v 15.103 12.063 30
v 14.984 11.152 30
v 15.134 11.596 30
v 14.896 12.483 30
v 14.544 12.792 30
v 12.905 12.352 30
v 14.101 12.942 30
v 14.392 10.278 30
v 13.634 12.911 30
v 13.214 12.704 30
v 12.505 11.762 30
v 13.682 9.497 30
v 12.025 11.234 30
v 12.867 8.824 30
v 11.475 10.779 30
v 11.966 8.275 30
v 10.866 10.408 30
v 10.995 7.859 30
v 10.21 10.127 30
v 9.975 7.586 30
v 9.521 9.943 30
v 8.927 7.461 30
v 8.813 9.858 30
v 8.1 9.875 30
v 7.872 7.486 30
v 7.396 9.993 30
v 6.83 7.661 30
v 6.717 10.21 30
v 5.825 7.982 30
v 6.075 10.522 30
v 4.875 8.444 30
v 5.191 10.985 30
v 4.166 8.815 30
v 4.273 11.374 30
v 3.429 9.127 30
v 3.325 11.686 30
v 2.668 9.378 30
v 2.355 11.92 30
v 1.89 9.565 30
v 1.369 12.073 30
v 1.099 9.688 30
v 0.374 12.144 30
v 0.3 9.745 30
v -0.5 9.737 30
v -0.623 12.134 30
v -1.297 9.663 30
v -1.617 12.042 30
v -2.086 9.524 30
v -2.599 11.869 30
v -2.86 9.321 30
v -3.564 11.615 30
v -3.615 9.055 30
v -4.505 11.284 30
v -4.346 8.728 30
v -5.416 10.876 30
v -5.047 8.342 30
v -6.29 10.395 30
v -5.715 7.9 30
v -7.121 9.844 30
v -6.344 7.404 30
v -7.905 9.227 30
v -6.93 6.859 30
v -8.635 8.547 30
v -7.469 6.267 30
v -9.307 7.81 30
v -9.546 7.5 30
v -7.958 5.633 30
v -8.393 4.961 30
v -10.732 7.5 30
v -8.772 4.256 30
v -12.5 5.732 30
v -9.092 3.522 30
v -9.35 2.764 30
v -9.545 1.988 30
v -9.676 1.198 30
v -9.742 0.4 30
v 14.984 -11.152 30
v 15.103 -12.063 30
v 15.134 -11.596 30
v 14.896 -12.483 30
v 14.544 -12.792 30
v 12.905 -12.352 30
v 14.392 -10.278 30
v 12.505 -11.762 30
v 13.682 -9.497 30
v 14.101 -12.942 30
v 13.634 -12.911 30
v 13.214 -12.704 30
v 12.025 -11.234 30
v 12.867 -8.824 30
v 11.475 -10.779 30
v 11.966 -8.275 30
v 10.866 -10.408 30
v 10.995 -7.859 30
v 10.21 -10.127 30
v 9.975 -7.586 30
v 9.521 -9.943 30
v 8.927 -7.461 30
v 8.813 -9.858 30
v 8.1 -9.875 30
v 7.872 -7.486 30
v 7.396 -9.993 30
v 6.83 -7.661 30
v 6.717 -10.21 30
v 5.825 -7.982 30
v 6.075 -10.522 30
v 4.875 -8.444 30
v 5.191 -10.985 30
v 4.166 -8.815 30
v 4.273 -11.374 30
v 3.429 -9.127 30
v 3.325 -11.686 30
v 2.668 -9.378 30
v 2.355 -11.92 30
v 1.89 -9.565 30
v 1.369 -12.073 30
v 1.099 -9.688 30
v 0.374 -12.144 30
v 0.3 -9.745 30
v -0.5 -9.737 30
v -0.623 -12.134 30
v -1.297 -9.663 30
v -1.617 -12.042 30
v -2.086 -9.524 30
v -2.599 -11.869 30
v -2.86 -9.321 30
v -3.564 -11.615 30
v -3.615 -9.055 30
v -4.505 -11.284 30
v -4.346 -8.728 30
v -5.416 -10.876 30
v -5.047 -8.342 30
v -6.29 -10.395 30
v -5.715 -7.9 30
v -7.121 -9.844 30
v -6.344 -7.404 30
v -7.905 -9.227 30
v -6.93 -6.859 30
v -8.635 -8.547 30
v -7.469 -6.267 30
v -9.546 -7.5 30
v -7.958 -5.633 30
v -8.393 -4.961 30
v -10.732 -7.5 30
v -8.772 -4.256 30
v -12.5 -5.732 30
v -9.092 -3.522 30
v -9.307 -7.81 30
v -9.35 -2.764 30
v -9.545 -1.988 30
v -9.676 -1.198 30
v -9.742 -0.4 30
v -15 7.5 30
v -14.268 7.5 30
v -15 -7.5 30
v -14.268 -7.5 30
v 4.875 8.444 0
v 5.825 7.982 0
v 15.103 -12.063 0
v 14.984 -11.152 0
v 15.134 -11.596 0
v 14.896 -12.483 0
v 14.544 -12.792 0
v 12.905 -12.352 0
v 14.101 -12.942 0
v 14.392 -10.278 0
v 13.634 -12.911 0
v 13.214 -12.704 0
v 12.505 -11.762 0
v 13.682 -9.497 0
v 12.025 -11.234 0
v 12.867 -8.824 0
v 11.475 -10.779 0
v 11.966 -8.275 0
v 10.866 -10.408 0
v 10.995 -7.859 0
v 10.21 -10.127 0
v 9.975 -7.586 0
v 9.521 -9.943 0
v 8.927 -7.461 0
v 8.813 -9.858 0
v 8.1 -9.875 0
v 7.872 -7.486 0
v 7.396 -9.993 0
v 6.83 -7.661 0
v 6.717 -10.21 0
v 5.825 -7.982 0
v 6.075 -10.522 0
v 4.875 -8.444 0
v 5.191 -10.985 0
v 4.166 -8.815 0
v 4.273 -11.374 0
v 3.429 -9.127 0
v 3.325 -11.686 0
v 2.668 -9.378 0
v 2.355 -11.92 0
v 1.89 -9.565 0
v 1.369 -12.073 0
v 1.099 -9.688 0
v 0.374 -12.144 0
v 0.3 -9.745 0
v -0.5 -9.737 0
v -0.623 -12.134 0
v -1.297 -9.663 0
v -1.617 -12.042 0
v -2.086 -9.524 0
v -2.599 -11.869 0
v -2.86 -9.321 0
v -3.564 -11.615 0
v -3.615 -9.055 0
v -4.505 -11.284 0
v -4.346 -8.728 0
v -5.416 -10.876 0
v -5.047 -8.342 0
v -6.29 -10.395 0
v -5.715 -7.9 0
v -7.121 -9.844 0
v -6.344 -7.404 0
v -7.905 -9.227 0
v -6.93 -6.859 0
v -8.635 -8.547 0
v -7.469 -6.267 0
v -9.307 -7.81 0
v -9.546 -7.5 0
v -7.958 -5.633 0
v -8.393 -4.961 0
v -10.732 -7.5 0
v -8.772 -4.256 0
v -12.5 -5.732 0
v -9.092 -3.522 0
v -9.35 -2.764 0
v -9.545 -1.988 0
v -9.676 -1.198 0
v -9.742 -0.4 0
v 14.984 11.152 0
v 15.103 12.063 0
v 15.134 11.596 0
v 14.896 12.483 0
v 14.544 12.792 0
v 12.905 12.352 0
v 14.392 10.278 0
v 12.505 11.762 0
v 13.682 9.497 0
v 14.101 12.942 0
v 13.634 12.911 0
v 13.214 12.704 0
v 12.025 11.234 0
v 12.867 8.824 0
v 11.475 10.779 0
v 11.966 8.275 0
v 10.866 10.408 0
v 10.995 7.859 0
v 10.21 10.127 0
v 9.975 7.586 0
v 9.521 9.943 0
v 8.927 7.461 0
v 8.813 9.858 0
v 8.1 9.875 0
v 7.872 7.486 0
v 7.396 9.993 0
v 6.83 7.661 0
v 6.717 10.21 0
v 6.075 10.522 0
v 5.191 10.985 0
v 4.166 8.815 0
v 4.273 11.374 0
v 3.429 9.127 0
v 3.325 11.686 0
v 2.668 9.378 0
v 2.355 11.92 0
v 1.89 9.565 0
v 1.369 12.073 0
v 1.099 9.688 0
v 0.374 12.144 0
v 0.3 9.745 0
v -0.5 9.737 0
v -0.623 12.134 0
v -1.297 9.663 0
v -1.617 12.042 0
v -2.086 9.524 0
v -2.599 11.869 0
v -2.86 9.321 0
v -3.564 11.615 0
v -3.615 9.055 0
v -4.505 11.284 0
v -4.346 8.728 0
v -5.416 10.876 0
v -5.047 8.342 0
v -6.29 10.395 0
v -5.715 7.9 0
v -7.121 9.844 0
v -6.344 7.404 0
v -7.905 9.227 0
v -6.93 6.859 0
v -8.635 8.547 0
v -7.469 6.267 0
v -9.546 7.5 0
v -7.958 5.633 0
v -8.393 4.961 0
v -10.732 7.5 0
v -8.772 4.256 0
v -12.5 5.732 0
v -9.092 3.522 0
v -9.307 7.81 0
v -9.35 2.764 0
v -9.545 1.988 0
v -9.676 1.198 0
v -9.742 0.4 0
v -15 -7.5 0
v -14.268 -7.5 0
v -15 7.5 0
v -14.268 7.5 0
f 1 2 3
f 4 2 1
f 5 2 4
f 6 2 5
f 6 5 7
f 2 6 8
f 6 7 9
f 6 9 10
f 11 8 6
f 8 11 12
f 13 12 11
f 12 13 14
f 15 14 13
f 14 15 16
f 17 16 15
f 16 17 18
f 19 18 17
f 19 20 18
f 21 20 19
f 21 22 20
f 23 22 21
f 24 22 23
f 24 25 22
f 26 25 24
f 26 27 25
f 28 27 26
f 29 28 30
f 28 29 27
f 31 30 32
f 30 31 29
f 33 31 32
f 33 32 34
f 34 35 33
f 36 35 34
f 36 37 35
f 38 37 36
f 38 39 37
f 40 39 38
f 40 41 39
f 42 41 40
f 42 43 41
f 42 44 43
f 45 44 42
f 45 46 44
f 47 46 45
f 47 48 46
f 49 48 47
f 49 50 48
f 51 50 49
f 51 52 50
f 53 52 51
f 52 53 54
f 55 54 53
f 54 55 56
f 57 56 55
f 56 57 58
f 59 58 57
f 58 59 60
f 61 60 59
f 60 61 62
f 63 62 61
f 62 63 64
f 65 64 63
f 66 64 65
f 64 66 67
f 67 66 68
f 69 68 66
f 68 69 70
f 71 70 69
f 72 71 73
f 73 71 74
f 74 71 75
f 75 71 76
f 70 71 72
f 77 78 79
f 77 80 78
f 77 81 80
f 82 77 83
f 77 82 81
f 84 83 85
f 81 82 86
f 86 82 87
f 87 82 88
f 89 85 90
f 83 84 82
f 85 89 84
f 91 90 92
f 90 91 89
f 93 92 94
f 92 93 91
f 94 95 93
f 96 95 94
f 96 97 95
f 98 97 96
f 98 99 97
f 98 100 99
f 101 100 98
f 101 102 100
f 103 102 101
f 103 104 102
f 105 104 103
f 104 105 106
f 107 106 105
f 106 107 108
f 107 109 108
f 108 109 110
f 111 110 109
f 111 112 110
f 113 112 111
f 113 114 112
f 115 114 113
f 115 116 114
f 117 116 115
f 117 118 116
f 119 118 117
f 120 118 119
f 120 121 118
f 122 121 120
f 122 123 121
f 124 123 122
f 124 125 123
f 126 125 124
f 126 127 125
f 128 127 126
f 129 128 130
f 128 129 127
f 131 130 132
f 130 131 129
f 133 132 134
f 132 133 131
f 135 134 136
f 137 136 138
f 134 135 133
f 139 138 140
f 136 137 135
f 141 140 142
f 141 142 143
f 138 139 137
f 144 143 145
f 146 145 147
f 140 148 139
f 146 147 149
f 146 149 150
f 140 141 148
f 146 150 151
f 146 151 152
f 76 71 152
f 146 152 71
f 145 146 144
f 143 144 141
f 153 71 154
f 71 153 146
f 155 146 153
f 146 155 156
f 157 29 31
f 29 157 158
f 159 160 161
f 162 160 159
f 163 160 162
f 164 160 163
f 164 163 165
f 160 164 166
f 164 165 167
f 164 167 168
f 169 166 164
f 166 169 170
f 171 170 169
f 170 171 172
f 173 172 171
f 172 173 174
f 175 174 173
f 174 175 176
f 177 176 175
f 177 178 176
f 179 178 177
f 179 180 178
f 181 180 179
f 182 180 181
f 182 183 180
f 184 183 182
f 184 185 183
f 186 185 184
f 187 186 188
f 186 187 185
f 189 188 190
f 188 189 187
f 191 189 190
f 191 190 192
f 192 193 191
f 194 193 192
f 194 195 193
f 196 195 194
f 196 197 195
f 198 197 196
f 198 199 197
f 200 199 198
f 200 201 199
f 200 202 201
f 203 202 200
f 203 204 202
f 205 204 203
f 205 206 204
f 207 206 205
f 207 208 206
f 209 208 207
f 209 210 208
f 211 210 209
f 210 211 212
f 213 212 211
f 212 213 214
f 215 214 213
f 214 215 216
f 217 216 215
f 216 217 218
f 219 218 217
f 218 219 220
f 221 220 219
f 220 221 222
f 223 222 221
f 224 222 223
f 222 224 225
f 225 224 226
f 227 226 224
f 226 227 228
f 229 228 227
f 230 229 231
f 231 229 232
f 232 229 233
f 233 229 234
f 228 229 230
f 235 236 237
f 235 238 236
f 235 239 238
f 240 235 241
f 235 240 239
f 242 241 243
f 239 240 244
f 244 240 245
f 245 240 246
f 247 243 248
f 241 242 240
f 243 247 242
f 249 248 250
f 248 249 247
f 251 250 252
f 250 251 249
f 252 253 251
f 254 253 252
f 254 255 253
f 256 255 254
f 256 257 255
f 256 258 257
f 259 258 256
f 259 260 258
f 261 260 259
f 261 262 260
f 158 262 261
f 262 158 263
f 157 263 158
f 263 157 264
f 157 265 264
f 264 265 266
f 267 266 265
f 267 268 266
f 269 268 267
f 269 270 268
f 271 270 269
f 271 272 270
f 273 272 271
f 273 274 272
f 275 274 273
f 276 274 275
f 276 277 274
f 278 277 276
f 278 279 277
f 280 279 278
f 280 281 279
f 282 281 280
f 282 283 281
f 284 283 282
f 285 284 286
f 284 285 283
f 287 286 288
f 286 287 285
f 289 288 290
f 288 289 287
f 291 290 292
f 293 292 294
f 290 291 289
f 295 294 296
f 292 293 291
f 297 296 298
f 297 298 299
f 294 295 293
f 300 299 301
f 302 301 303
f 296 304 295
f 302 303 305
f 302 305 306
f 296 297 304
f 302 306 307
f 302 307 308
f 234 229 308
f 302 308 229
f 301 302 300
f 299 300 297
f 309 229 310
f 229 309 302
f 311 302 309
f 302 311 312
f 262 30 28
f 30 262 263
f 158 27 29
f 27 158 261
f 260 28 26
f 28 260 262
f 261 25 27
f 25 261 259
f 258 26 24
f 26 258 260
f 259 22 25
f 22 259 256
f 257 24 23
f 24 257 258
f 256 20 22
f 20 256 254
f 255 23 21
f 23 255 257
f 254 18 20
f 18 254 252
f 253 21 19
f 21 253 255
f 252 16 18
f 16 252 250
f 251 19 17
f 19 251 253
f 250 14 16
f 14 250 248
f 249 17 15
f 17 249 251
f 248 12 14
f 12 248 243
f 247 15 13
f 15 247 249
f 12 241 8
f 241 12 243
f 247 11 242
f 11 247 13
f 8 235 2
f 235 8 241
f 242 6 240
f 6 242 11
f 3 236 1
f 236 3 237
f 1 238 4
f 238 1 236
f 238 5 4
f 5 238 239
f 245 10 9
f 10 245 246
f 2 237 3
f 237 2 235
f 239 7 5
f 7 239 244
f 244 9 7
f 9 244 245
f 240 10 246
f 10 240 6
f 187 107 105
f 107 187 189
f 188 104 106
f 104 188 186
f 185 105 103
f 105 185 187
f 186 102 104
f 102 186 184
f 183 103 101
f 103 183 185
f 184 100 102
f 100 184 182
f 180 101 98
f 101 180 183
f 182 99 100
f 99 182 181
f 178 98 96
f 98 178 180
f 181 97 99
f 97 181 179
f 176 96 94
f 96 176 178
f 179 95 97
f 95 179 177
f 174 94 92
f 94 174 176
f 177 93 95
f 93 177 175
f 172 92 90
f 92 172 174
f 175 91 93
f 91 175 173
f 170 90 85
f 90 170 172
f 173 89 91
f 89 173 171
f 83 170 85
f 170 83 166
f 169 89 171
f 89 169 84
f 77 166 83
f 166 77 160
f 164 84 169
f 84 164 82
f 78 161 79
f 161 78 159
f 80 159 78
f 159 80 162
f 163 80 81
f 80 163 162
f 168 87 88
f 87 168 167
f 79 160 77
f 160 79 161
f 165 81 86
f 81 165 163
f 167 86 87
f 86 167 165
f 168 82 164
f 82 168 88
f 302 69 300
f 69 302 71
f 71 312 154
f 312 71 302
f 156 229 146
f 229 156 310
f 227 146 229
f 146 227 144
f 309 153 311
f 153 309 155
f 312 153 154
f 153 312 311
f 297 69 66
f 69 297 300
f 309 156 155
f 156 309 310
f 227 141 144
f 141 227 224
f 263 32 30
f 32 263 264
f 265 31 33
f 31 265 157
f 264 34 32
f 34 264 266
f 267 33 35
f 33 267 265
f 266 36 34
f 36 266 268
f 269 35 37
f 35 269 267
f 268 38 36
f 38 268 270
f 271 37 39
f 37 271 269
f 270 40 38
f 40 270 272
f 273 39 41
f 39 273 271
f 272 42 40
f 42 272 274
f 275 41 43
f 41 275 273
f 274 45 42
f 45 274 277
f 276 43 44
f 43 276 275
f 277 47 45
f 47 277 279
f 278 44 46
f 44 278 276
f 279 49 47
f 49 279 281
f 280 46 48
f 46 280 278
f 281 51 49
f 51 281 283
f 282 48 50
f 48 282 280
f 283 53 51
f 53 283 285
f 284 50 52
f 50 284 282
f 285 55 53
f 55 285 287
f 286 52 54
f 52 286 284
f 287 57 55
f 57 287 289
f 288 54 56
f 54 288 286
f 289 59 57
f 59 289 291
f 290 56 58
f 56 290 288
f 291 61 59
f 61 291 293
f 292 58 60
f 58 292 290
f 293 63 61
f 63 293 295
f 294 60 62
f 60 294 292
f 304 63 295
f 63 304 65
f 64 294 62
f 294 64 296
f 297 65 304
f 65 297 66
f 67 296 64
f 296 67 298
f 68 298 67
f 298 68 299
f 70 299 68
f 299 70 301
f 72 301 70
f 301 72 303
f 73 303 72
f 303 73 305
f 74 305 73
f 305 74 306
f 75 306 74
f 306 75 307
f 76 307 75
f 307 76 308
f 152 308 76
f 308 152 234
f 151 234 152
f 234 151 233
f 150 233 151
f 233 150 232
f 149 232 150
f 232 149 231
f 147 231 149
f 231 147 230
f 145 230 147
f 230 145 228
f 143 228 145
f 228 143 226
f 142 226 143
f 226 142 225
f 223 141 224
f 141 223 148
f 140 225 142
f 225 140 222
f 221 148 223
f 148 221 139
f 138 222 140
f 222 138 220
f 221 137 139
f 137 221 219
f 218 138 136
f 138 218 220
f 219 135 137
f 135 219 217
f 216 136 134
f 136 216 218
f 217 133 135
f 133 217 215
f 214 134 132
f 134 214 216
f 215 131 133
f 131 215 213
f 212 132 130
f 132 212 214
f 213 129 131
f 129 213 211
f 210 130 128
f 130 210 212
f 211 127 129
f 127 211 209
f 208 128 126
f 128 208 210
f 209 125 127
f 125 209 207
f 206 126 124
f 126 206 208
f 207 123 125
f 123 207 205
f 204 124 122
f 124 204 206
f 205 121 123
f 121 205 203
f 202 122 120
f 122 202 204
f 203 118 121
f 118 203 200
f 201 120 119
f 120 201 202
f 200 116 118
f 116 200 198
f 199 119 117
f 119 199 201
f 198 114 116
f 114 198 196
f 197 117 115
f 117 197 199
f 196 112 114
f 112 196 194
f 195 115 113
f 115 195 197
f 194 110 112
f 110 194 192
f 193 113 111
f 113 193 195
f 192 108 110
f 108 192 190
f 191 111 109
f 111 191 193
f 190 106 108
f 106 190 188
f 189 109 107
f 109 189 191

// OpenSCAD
// file: symmetry.scad
// duplicate and mirror
module mirror_dup(v) {
  children();
  mirror(v) children();
}

// duplicate and mirror in x
module mirror_dup_x () { mirror_dup([1,0,0]) children(); }
// duplicate and mirror in y
module mirror_dup_y () { mirror_dup([0,1,0]) children(); }
// duplicate and mirror in z
module mirror_dup_z () { mirror_dup([0,0,1]) children(); }

// translate in v and duplicate in +-d
module translate_s(v=[0,0,0],d=[0,0,0]) {
  translate(v) {
    translate(d) children();
    translate(-1*d) children();
  }
}

// translate and duplicate in +-x
module translate_xs(v=[0,0,0], dx=undef) {
  v = len(v)==2?[v.x,v.y,0]:v;
  if (is_undef(dx)) {
    translate(v) children();
    translate(v*[[-1,0,0],[0,1,0],[0,0,1]]) children();
  }
  else {
    translate(v) {
      translate([ dx,0,0]) children();
      translate([-dx,0,0]) children();
    }
  }
}

// translate and duplicate in +-y
module translate_ys(v=[0,0,0], dy=undef) {
  v = len(v)==2?[v.x,v.y,0]:v;
  if (is_undef(dy)) {
    translate(v) children();
    translate(v*[[1,0,0],[0,-1,0],[0,0,1]]) children();
  }
  else {
    translate(v) {
      translate([0, dy,0]) children();
      translate([0,-dy,0]) children();
    }
  }
}

// translate and duplicate in +-z
module translate_zs(v=[0,0,0], dz=undef) {
  if (is_undef(dz)) {
    translate(v) children();
    translate(v*[[1,0,0],[0,1,0],[0,0,-1]]) children();
  }
  else {
    translate(v) {
      translate([0,0, dz]) children();
      translate([0,0,-dz]) children();
    }
  }
}

// rotate +-a about v
module rotate_s(a,v=undef,orig=false) {
  if (orig == true) { children(); }
  if (is_list(a) || is_undef(v)) {
    rotate(a) children();
    rotate(-a) children();
  }
  else {
    rotate(a,v) children();
    rotate(-a,v) children();
  }
}

// rotate about vector starting at vs with direction v
module rotate_v(a, v=[0,0,1], vs=[0,0,0]) {
  translate(vs) rotate(a=a, v=v) translate(-1*vs) children();
}

// duplicate with rotational symmetry
module rsym(n) {
  for (a=[0:360/n:359]) rotate(a) children();
}

// rotate extrusion symmetric about x=0 plane
module rotate_extrude_s(angle=360,convexity=10) {
  rotate(-angle/2) rotate_extrude(angle=angle,convexity=convexity) children();
}
// file: metricparts.scad
include <threads.scad>

module nut_cut(fwidth, height, allowance=0) {
  cylinder($fn=6,r=(allowance+fwidth/2)/sin(60),h=height);
}

function get_hex_side(p) = lookup(p, [
 		[   1, 2.5 ],
 		[ 1.2, 3.0 ],
 		[ 1.4, 3.0 ],
 		[ 1.6, 3.2 ],
 		[   2, 4.0 ],
 		[ 2.5, 5.0 ],
 		[   3, 5.5 ],
 		[ 3.5, 6 ],
 		[   4, 7 ],
 		[   5, 8 ],
 		[   6, 10 ],
 		[   7, 11 ],
 		[   8, 13 ],
 		[  10, 17 ],
 	]);

function get_hex_major(p) = get_hex_side(p)/sin(60);

function get_hex_thick(p) = lookup(p, [
 		[   1, 0.8 ],
 		[ 1.2, 1 ],
 		[ 1.4, 1.2 ],
 		[ 1.6, 1.3 ],
 		[   2, 1.6 ],
 		[ 2.5, 2 ],
 		[   3, 2.4 ],
 		[ 3.5, 2.8 ],
 		[   4, 3.2 ],
 		[   5, 4 ],
 		[   6, 5 ],
 		[   7, 5.5 ],
 		[   8, 6.5 ],
 		[  10, 8 ],
 	]);

function get_pitch(p) = lookup(p, [
 		[   1, 0.25 ],
 		[ 1.2, 0.25 ],
 		[ 1.4, 0.3 ],
 		[ 1.6, 0.35 ],
 		[   2, 0.45 ],
 		[ 2.5, 0.45 ],
 		[   3, 0.6 ],
 		[ 3.5, 0.6 ],
 		[   4, 0.75 ],
 		[   5, 1 ],
 		[   6, 1 ],
 		[   7, 1 ],
 		[   8, 1.25 ],
 		[  10, 1.5 ],
 	]);

function get_washer_side(p) = lookup(p, [
 		[ 1.6, 4 ],
 		[   2, 5 ],
 		[ 2.5, 6 ],
 		[   3, 7 ],
 		[ 3.5, 8 ],
 		[   4, 9 ],
 		[   5, 10 ],
 		[   6, 12 ],
 		[   7, 14 ],
 		[   8, 16 ],
 		[  10, 20 ],
 	]);

function get_washer_hole(p) = lookup(p, [
 		[ 1.6, 1.7 ],
 		[   2, 2.2 ],
 		[ 2.5, 2.7 ],
 		[   3, 3.2 ],
 		[ 3.5, 3.7 ],
 		[   4, 4.3 ],
 		[   5, 5.3 ],
 		[   6, 6.4 ],
 		[   7, 7.4 ],
 		[   8, 8.4 ],
 		[  10, 10.5 ],
 	]);

function get_washer_thick(p) = lookup(p, [
 		[ 1.6, 0.3 ],
 		[   2, 0.3 ],
 		[ 2.5, 0.5 ],
 		[   3, 0.5 ],
 		[ 3.5, 0.5 ],
 		[   4, 0.8 ],
 		[   5, 1 ],
 		[   6, 1.6 ],
 		[   7, 1.6 ],
 		[   8, 1.6 ],
 		[  10, 2 ],
 	]);

function get_thread_depth(p) = get_pitch(p)*0.866;

module metric_washer(size) {
  difference() {
    cylinder(d=get_washer_side(size),h=get_washer_thick(size));
    translate([0,0,-0.1]) cylinder(d=get_washer_hole(size),h=get_washer_thick(size)+0.2);
  }
}

module shaftsupport_nut(
size, // nut size
allowance=0, // side allowance
sfactor=1.05, // shaft size factor
layer=0.2, // layer thickness
) {
  id = size*sfactor;
  od = (allowance+get_hex_side(size)/2)/sin(60);
  dd1=max(id/sin(30),od);
  translate([0,0,-0.01]) cylinder(d=dd1,h=layer+0.01,$fn=3);
  translate([0,0,layer-0.01]) intersection() {
    cylinder(d=dd1,h=layer+0.01,$fn=3);
    rotate(60) cylinder(d=id/sin(30),h=layer+0.01,$fn=3);
  }
}

module metric_nut_cut(
size, // nut size
depth=0, // override auto depth
add_depth=0, // additional depth over auto depth
allowance=0, // side allowance
) {
  nut_cut(get_hex_side(size),add_depth+((depth==0)?get_hex_thick(size):depth),allowance=allowance);
}

module metric_shaft_cut(
size, // bolt size
length, // cut depth
sfactor=1.05, // shaft oversize factor
shaft="free", // "free", "threaded", "undersized" or "undersized_hex"
allowance=0, // allowance for thread
test=$preview, // test mode
) {
  if (shaft == "threaded") {
    metric_thread(diameter=size+allowance,pitch=get_pitch(size),length=length,internal=true,test=test);
  }
  else if (shaft == "undersized") {
    cylinder(d=size-1.5*get_thread_depth(size), h=length);
  }
  else if (shaft == "undersized_hex") {
    cylinder(d=size, h=length, $fn=6);
  }
  else { //(shaft == "free") {
    cylinder(d=size*sfactor, h=length);
  }
}

module metric_countersunk_cut(
size, // bolt size
length, // cut depth
factor=1.1, // cone oversize factor
sfactor=1.05, // shaft oversize factor
shaft="free", // "free", "threaded", "undersized" or "undersized_hex"
allowance=0, // allowance for thread
test=$preview, // test mode
) {
  translate([0,0,-size*1.05]) union() {
    cylinder(d1=0,d2=size*2*(factor+0.05),h=size*(factor+0.05));
    translate([0,0,-length-size/2])
      metric_shaft_cut(size=size, length=length+size, sfactor=sfactor, shaft=shaft, allowance=allowance, test=test);
  }
}
// main file
use <metricparts.scad>
use <symmetry.scad>
$fa=2;
$fs=1;
PoleDia = 20;
wall = 2.4;
width = 15;
length = 30;
angle = 30;
cut = 1.25;
flex = 0.5;

CurveDia = PoleDia-flex;

union() {
  rotate(90-angle) rotate_extrude(angle=180+angle*2) {
    translate([CurveDia/2,0,0]) square([wall,length]);
  }

  mirror_dup_y() translate([(5+wall+CurveDia/2)*sin(angle),(5+wall+CurveDia/2)*cos(angle),0]) {
    rotate(-(90+angle)) rotate_extrude(angle=90) translate([5,0,0]) square([wall,length]);
    rotate(-angle) translate([5+wall/2,0,0]) cylinder(d=wall,h=length,$fn=16);
  }

  difference() {
    translate([-PoleDia/2-cut*4,-width/2,0]) cube([PoleDia/2+cut*4, width,length]);
    translate([0,0,-1]) cylinder(d=PoleDia+wall,h=length+2);
    translate_ys([-PoleDia/2-cut*2,width/2,-1]) cylinder(d=2*cut*sqrt(2),h=length+2,$fn=4);
  }
}
